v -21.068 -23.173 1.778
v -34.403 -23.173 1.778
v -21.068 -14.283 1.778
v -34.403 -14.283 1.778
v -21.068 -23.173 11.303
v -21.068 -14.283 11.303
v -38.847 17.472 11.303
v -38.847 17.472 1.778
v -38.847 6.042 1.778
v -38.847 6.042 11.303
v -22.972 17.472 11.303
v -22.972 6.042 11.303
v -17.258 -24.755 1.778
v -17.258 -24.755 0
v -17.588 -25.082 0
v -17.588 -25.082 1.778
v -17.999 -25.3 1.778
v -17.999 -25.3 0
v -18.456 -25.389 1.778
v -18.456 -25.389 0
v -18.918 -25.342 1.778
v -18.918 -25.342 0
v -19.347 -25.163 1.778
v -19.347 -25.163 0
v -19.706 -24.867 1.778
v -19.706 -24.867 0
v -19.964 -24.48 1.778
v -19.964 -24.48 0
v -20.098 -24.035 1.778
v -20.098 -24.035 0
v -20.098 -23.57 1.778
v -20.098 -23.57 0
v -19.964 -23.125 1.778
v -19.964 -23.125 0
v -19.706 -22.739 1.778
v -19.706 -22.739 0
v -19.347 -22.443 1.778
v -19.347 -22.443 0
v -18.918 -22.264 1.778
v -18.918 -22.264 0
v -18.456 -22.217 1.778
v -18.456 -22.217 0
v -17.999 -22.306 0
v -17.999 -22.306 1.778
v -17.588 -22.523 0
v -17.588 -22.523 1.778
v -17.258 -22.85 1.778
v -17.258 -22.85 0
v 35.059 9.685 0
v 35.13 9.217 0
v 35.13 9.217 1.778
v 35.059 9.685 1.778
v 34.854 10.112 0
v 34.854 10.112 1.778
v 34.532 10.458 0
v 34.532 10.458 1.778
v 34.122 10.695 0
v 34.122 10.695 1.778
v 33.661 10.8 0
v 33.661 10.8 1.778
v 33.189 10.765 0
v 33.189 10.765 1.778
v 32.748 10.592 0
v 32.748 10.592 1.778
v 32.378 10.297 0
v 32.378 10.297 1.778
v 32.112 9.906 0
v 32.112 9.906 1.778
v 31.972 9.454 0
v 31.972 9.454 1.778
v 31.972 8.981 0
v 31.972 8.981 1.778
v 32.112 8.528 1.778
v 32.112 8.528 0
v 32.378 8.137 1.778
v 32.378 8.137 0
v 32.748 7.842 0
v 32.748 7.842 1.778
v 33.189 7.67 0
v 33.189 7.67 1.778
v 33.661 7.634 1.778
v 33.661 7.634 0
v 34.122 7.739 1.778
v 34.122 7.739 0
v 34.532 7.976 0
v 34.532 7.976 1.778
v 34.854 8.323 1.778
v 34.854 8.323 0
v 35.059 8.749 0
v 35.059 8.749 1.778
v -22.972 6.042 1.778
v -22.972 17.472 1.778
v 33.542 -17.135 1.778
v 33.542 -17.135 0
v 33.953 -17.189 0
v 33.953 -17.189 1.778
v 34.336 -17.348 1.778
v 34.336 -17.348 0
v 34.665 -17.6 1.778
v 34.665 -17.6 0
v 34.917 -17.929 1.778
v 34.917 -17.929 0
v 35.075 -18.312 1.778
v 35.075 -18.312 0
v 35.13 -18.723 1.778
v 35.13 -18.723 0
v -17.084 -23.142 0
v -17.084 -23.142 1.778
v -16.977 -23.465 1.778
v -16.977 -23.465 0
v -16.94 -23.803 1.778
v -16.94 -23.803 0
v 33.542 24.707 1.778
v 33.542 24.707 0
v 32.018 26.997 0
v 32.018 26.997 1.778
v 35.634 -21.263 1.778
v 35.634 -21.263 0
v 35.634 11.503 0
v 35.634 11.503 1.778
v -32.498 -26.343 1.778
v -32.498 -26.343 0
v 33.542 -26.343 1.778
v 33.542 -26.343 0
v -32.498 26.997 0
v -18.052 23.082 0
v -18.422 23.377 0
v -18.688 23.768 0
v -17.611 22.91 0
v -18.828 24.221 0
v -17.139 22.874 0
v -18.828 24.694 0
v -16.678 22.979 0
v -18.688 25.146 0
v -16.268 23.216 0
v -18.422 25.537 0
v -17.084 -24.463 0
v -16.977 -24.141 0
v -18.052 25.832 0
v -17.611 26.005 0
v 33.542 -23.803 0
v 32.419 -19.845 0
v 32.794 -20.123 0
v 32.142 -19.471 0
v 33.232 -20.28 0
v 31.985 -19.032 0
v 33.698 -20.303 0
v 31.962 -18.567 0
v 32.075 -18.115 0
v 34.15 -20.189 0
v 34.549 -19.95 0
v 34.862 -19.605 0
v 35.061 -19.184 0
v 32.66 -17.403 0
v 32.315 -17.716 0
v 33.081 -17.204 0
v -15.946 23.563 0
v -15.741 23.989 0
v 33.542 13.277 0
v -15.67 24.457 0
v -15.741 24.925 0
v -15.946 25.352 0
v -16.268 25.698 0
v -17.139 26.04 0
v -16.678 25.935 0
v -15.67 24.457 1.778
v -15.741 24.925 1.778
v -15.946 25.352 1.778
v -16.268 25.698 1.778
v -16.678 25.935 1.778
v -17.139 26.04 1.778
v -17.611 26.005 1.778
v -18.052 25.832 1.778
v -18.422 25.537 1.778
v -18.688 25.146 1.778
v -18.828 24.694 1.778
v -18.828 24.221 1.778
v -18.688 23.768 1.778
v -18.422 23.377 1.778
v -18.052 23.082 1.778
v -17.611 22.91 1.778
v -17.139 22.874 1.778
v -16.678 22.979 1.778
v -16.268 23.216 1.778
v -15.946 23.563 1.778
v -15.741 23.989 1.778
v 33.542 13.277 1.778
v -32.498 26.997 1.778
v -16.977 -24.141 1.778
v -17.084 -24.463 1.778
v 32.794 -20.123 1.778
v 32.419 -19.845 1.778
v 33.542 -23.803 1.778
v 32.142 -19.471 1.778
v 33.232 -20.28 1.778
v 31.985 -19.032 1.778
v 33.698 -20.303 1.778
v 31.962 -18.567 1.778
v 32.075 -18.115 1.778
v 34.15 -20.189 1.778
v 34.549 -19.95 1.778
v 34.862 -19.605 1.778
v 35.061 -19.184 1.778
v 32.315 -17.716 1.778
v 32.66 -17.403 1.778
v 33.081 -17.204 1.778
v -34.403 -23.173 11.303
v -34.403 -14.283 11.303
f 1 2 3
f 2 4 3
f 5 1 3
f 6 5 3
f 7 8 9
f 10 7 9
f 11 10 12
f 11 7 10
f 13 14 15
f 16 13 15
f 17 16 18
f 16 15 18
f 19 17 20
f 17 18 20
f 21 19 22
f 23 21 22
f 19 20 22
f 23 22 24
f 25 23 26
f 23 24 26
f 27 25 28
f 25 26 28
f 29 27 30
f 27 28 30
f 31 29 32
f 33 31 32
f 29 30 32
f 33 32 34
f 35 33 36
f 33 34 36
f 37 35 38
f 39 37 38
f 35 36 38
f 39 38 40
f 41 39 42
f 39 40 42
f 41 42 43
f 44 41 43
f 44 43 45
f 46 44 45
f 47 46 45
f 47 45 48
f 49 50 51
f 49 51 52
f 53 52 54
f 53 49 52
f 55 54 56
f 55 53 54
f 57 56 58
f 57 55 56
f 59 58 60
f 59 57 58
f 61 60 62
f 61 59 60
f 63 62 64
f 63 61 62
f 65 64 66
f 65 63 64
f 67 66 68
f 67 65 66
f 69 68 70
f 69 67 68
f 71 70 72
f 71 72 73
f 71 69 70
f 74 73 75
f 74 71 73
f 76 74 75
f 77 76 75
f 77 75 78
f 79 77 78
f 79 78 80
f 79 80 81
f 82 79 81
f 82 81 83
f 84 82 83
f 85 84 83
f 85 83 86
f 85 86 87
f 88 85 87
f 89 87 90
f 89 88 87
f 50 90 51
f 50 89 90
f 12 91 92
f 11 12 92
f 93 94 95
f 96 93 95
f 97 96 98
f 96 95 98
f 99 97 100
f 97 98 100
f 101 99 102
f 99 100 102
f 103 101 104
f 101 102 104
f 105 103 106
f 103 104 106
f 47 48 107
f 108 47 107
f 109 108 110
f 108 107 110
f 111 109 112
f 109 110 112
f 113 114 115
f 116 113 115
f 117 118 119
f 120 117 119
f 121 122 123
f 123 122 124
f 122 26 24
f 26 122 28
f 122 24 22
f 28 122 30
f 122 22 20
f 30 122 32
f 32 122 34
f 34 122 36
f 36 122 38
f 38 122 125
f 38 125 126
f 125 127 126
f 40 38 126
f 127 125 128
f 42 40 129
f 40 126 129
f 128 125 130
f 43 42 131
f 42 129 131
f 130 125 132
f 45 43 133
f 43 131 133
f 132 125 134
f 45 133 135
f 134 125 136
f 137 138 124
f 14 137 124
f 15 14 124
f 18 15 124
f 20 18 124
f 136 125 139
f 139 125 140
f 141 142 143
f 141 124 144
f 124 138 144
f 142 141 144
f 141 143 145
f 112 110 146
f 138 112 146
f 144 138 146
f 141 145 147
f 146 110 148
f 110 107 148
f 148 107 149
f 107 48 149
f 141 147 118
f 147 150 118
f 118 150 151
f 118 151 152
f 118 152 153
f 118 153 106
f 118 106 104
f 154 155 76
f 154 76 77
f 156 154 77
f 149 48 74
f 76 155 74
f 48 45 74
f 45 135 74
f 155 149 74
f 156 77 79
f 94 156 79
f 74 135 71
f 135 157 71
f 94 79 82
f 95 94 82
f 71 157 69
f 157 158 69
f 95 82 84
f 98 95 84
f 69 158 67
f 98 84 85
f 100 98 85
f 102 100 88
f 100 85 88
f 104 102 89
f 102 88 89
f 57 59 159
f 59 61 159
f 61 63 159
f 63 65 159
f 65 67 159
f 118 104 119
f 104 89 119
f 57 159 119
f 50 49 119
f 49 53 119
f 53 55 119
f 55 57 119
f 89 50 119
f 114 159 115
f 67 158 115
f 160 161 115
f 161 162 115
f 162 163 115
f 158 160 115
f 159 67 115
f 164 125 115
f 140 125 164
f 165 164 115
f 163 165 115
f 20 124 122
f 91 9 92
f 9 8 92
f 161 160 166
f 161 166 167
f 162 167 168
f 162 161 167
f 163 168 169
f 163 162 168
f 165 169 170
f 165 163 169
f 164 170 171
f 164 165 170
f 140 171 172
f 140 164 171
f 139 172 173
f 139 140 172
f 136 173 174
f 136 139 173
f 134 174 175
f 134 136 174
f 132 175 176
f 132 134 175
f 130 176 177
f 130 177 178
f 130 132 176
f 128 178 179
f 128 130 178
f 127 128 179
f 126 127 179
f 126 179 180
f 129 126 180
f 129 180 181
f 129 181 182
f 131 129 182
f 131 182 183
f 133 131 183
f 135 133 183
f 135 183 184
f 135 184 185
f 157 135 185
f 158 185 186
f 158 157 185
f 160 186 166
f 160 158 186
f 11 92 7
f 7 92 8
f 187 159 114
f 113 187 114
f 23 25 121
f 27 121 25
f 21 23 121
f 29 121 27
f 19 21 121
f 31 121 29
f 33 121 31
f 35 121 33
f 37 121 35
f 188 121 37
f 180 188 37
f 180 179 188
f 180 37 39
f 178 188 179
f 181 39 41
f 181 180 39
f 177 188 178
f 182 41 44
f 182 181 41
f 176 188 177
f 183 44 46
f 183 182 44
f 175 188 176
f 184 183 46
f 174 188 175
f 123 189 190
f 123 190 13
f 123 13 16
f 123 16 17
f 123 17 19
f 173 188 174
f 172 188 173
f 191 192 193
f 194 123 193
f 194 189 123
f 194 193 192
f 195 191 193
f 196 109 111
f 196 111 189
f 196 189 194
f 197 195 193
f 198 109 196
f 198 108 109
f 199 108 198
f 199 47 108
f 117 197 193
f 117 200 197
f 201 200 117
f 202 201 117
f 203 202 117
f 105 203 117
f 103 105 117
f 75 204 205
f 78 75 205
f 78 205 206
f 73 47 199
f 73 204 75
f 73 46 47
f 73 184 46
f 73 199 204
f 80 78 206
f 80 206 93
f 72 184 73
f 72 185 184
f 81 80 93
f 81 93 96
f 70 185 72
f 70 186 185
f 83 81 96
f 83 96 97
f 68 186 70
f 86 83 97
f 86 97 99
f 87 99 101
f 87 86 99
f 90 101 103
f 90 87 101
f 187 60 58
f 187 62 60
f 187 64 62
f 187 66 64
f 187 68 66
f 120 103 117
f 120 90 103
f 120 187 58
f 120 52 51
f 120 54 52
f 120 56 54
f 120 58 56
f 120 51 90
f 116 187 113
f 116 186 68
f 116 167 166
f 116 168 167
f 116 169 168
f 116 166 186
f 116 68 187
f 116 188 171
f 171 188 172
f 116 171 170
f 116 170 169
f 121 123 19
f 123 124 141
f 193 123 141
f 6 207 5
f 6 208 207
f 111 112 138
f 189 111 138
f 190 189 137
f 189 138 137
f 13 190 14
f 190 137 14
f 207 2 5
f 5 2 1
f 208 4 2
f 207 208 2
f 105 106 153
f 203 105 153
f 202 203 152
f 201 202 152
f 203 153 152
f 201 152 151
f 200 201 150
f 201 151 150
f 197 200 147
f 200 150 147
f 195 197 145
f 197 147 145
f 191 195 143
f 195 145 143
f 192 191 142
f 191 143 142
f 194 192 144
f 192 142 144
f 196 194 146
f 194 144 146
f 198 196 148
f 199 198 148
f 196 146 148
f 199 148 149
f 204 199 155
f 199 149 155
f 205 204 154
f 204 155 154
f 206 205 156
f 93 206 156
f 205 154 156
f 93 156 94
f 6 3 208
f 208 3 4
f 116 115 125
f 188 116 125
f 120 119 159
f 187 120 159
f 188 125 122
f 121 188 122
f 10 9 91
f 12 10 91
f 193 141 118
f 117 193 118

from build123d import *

# Parameters (mm, degrees)
F0_R     = 1.5875
F1_DEPTH = 1.778
F3_DEPTH = 9.525


with BuildPart() as f1:
    # F0 (on Top) → F1 (new body)
    with BuildSketch(Plane.XY):
        Polygon((32.018022109, 26.997238813), (-32.497977891, 26.997238813), (-32.497977891, -26.342761187), (-17.257977891, -26.342761187), (33.542022109, -26.342761187), (33.542022109, -23.802761187), (35.6338508427, -21.262761187), (35.6338508427, 11.503238813), (33.542022109, 13.2765648437), (33.542022109, 24.7065648437), align=None)
        with BuildLine():
            ThreePointArc((-16.940477891, -23.802761187), (-17.0219431553, -24.3047727655), (-17.257977891, -24.755261187))
            ThreePointArc((-17.257977891, -24.755261187), (-20.115477891, -23.802761187), (-17.257977891, -22.850261187))
            ThreePointArc((-17.257977891, -22.850261187), (-17.0219431553, -23.3007496084), (-16.940477891, -23.802761187))
        make_face(mode=Mode.SUBTRACT)
        with BuildLine():
            ThreePointArc((33.542022109, -17.135261187), (34.6645541242, -17.6002291718), (35.129522109, -18.722761187))
            ThreePointArc((35.129522109, -18.722761187), (32.4194900939, -19.8452932021), (33.542022109, -17.135261187))
        make_face(mode=Mode.SUBTRACT)
        with Locations((-17.257977891, 24.457238813)):
            Circle(F0_R, mode=Mode.SUBTRACT)
        with Locations((33.542022109, 9.217238813)):
            Circle(F0_R, mode=Mode.SUBTRACT)
    extrude(amount=F1_DEPTH)


with BuildPart() as f3:
    # F2 (on face) → F3 (new body)
    with BuildSketch(Plane.XY.offset(1.778)):
        Polygon((-38.8474246323, 6.042238813), (-32.4974246323, 6.042238813), (-23.153425312, 6.042238813), (-22.9724246323, 6.042238813), (-22.9724246323, 17.472238813), (-32.497977891, 17.472238813), (-38.8474246323, 17.472238813), align=None)
    extrude(amount=F3_DEPTH)


with BuildPart() as f3b:
    # F2 (on face) → F3, piece 2 (new body)
    with BuildSketch(Plane.XY.offset(1.778)):
        Polygon((-34.4030318546, -23.1734532863), (-32.4980318546, -23.1734532863), (-21.0680318546, -23.1734532863), (-21.0680318546, -14.2834532863), (-34.4030318546, -14.2834532863), align=None)
    extrude(amount=F3_DEPTH)


solid = Compound([f1.part, f3.part, f3b.part])
